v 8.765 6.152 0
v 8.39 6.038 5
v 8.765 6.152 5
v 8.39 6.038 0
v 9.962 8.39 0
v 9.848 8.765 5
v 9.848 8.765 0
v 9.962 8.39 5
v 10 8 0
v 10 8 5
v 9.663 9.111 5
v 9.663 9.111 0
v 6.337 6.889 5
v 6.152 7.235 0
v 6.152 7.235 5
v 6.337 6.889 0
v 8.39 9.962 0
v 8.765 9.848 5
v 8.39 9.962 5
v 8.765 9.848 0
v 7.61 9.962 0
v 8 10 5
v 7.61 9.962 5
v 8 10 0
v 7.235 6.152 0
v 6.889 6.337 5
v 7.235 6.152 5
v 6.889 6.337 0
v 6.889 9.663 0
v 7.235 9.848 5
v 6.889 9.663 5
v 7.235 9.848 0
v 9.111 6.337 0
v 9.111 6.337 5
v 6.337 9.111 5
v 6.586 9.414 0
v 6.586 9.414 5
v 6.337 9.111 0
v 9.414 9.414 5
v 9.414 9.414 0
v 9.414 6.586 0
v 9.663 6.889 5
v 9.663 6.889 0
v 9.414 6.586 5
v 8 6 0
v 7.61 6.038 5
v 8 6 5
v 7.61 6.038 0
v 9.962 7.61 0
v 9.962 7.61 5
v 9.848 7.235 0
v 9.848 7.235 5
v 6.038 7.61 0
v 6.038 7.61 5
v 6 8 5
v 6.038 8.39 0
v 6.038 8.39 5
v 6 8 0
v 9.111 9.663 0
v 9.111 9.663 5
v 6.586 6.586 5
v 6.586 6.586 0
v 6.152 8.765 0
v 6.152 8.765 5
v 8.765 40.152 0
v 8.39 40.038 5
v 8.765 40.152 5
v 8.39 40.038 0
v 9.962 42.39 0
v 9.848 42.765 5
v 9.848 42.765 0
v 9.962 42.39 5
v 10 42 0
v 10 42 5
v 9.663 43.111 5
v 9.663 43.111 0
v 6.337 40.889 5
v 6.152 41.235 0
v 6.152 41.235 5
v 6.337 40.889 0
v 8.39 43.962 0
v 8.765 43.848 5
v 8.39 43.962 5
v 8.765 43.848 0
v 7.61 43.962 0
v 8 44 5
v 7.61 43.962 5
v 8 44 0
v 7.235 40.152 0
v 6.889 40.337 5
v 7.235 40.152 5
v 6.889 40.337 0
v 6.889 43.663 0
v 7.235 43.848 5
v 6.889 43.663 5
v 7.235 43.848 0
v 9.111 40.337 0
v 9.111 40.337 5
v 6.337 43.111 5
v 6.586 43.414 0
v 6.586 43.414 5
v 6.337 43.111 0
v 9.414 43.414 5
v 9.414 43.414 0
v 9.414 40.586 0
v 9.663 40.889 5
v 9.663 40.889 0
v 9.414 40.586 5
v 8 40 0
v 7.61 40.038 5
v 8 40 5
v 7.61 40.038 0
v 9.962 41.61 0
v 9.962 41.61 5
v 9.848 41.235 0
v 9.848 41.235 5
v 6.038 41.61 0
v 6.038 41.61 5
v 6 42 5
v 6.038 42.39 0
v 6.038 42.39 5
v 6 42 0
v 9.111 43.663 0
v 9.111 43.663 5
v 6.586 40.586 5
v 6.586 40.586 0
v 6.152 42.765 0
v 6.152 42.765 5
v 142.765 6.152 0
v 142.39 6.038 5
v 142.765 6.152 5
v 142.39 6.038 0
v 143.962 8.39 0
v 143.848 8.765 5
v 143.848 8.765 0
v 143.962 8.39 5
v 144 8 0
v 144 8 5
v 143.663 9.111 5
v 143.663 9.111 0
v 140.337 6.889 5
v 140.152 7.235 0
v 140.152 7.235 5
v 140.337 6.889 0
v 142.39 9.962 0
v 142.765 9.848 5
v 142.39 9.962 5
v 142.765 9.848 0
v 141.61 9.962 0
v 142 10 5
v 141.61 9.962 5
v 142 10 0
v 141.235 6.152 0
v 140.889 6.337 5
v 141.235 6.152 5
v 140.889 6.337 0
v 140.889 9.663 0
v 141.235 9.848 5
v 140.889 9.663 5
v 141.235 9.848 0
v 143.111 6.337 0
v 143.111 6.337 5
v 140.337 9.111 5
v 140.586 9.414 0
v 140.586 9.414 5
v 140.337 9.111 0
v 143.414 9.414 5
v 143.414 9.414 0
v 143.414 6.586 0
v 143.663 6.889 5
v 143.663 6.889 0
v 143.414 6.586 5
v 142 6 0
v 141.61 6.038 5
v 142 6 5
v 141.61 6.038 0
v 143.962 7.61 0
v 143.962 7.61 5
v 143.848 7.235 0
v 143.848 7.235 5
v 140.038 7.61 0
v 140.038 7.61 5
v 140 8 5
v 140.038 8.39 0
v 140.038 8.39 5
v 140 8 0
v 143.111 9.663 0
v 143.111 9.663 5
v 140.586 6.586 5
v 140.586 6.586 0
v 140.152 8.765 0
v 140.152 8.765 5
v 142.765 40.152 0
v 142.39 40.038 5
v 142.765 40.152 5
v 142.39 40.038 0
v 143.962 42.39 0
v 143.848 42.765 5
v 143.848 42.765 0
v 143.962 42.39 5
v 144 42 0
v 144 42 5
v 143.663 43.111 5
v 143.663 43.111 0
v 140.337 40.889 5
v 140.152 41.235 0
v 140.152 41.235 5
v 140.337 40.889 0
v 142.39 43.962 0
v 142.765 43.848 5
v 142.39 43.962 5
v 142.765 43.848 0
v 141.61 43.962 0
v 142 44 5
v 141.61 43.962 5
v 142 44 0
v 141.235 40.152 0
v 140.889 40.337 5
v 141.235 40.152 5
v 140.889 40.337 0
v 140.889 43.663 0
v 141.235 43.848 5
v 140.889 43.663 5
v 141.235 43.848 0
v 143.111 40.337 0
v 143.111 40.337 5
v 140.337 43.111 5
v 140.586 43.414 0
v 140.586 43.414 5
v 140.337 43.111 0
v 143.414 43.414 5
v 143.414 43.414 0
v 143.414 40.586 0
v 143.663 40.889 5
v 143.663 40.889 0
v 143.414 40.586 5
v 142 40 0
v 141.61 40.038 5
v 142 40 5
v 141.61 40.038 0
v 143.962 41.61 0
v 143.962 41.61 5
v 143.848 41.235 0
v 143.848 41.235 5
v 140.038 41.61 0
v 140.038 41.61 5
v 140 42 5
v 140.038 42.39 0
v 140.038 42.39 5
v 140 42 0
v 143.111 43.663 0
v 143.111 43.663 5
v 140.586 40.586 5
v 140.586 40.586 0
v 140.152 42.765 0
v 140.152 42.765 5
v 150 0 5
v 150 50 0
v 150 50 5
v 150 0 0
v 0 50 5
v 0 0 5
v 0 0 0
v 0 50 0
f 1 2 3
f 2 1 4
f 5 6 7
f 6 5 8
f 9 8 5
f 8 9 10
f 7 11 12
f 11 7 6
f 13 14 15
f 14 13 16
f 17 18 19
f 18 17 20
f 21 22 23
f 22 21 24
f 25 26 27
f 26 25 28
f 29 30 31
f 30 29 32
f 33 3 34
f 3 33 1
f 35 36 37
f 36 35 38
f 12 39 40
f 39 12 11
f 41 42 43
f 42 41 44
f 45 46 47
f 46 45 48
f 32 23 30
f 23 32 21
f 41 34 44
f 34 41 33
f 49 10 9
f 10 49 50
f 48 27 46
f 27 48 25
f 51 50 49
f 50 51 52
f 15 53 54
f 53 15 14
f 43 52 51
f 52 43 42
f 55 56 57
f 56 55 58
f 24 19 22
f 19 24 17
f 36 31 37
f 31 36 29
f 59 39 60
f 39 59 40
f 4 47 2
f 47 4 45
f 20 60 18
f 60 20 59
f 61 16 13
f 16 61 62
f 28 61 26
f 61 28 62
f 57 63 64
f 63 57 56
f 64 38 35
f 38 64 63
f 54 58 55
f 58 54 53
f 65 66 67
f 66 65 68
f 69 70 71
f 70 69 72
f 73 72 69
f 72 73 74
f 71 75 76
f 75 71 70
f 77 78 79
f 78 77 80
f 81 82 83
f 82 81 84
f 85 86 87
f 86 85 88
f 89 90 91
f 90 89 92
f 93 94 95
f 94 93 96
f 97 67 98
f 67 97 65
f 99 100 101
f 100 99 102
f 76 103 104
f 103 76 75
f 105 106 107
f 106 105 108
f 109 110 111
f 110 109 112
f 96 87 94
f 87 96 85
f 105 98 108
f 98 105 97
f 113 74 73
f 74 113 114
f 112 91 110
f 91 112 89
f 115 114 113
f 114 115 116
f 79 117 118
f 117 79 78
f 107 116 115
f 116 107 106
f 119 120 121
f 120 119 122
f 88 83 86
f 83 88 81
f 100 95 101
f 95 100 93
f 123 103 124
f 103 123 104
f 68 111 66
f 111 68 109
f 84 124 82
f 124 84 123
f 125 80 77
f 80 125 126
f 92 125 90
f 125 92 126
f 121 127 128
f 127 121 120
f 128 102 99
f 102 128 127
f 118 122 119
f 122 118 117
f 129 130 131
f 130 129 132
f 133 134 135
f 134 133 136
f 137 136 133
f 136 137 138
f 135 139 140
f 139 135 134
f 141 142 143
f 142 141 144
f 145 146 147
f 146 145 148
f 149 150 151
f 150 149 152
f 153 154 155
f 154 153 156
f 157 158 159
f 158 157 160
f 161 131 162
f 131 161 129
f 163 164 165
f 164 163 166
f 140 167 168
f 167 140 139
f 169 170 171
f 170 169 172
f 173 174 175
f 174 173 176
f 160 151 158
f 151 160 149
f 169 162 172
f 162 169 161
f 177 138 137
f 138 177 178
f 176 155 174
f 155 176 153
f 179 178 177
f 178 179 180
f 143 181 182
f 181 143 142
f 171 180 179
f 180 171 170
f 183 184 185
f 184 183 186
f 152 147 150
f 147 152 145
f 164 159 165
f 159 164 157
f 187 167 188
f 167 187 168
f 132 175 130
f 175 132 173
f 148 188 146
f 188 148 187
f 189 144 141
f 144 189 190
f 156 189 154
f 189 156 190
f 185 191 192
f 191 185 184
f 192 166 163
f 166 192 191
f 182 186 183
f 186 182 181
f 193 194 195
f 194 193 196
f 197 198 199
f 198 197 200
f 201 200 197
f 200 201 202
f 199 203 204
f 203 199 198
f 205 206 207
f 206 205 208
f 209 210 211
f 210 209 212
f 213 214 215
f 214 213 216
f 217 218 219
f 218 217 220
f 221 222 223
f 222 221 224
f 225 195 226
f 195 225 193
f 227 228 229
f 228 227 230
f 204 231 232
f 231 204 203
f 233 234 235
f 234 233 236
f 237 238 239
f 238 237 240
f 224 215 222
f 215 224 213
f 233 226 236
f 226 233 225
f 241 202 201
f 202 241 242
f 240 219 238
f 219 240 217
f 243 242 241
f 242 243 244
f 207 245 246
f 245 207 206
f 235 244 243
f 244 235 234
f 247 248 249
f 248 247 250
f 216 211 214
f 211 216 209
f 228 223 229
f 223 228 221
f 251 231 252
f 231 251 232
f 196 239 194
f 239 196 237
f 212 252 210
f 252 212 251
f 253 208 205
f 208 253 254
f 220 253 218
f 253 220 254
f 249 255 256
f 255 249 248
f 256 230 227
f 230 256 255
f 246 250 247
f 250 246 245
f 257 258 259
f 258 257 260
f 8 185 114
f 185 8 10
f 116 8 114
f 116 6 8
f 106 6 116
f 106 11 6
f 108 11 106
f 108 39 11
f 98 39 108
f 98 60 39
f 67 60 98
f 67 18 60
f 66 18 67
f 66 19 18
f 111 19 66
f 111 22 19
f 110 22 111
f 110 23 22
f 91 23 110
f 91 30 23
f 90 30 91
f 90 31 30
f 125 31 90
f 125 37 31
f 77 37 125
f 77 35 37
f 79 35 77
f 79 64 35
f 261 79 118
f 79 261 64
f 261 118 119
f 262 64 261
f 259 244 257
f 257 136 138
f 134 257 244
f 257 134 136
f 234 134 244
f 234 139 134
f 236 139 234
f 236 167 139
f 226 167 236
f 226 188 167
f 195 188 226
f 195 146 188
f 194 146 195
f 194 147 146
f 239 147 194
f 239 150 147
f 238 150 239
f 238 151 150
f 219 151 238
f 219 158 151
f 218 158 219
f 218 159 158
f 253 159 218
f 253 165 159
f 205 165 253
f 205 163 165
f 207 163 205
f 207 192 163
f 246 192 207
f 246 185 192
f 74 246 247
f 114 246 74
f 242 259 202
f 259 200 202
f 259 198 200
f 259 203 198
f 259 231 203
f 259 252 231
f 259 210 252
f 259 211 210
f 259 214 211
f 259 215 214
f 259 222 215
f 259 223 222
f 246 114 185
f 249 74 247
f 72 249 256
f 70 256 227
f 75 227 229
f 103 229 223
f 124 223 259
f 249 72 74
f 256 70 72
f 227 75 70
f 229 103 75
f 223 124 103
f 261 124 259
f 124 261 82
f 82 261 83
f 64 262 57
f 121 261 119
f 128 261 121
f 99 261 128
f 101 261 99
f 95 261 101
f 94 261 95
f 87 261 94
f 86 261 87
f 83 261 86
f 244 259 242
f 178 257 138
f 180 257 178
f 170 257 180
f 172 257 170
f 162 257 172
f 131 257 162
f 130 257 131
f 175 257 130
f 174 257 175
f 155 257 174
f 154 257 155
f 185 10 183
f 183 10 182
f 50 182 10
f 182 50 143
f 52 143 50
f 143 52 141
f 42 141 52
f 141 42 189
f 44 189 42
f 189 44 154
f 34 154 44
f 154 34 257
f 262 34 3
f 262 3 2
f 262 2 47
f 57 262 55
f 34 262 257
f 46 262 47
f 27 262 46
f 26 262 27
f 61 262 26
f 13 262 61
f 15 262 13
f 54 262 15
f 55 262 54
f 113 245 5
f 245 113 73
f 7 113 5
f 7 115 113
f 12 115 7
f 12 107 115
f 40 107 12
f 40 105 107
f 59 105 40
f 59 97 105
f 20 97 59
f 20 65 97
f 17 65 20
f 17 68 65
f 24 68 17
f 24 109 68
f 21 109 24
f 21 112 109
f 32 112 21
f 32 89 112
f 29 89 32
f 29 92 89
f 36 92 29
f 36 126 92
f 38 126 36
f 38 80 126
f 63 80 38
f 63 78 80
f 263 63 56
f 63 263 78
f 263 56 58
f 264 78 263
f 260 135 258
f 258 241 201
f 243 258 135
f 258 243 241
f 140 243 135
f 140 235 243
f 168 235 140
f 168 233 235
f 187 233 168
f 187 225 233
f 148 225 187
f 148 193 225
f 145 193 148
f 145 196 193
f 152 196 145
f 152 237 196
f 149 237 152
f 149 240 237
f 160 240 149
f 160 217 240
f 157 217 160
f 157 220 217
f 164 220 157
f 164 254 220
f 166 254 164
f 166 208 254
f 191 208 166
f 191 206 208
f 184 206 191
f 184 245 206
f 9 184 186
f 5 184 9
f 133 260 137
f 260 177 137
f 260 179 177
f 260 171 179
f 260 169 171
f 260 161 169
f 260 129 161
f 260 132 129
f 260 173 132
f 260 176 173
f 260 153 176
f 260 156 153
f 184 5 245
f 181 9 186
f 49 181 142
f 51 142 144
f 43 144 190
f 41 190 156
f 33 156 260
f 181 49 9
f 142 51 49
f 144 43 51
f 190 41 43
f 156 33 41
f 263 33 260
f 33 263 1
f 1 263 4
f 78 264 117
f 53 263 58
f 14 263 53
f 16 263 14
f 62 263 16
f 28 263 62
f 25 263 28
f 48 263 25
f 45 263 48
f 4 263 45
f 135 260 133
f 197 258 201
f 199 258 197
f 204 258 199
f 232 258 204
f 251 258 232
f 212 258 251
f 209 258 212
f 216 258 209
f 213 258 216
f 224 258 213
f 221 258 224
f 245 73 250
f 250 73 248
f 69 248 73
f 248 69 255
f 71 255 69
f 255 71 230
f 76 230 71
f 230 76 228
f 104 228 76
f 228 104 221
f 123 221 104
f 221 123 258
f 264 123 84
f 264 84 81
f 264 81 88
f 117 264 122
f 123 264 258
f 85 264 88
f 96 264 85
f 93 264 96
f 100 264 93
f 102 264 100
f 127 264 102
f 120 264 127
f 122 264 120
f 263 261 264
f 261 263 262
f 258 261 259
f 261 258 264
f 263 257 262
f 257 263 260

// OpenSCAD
// base.scad
// Base plate for a multi-part classroom sign example (assembly part 1 of
// 3: base plate + raised text layer + accent badge). Hand-authored for the
// ai-3d-factory examples/ library (examples/multipart-classroom-sign/) -
// no built-in `factory generate-openscad` template covers a 3-part sign
// with an icon/badge accent yet (the built-in `multipart-nameplate`
// template only covers a base + text pair - see
// factory/openscad/templates.py). Keep plate_width/plate_depth/
// plate_height in sync with text_layer.scad and badge.scad - all three
// parts share the same (0,0,0) origin and must be imported into the
// slicer without re-centering any of them. See
// docs/slicer-review-workflow.md.
//
// This repo does not run OpenSCAD automatically. Geometry sanity check
// passed does not mean print-ready - human slicer review is still
// required. See AGENT.md.

// ---- Shared parameters (all in millimeters) - keep in sync with text_layer.scad and badge.scad ----
plate_width = 150;
plate_depth = 50;
plate_height = 5;

// ---- Base-only parameters ----
mounting_hole_diameter = 4;   // set to 0 to omit the 4 corner mounting holes
mounting_hole_margin = 8;     // distance of hole centers from each edge

module mounting_holes() {
    for (x = [mounting_hole_margin, plate_width - mounting_hole_margin])
        for (y = [mounting_hole_margin, plate_depth - mounting_hole_margin])
            translate([x, y, -1])
                cylinder(d = mounting_hole_diameter, h = plate_height + 2, $fn = 32);
}

difference() {
    cube([plate_width, plate_depth, plate_height]);
    if (mounting_hole_diameter > 0) {
        mounting_holes();
    }
}
